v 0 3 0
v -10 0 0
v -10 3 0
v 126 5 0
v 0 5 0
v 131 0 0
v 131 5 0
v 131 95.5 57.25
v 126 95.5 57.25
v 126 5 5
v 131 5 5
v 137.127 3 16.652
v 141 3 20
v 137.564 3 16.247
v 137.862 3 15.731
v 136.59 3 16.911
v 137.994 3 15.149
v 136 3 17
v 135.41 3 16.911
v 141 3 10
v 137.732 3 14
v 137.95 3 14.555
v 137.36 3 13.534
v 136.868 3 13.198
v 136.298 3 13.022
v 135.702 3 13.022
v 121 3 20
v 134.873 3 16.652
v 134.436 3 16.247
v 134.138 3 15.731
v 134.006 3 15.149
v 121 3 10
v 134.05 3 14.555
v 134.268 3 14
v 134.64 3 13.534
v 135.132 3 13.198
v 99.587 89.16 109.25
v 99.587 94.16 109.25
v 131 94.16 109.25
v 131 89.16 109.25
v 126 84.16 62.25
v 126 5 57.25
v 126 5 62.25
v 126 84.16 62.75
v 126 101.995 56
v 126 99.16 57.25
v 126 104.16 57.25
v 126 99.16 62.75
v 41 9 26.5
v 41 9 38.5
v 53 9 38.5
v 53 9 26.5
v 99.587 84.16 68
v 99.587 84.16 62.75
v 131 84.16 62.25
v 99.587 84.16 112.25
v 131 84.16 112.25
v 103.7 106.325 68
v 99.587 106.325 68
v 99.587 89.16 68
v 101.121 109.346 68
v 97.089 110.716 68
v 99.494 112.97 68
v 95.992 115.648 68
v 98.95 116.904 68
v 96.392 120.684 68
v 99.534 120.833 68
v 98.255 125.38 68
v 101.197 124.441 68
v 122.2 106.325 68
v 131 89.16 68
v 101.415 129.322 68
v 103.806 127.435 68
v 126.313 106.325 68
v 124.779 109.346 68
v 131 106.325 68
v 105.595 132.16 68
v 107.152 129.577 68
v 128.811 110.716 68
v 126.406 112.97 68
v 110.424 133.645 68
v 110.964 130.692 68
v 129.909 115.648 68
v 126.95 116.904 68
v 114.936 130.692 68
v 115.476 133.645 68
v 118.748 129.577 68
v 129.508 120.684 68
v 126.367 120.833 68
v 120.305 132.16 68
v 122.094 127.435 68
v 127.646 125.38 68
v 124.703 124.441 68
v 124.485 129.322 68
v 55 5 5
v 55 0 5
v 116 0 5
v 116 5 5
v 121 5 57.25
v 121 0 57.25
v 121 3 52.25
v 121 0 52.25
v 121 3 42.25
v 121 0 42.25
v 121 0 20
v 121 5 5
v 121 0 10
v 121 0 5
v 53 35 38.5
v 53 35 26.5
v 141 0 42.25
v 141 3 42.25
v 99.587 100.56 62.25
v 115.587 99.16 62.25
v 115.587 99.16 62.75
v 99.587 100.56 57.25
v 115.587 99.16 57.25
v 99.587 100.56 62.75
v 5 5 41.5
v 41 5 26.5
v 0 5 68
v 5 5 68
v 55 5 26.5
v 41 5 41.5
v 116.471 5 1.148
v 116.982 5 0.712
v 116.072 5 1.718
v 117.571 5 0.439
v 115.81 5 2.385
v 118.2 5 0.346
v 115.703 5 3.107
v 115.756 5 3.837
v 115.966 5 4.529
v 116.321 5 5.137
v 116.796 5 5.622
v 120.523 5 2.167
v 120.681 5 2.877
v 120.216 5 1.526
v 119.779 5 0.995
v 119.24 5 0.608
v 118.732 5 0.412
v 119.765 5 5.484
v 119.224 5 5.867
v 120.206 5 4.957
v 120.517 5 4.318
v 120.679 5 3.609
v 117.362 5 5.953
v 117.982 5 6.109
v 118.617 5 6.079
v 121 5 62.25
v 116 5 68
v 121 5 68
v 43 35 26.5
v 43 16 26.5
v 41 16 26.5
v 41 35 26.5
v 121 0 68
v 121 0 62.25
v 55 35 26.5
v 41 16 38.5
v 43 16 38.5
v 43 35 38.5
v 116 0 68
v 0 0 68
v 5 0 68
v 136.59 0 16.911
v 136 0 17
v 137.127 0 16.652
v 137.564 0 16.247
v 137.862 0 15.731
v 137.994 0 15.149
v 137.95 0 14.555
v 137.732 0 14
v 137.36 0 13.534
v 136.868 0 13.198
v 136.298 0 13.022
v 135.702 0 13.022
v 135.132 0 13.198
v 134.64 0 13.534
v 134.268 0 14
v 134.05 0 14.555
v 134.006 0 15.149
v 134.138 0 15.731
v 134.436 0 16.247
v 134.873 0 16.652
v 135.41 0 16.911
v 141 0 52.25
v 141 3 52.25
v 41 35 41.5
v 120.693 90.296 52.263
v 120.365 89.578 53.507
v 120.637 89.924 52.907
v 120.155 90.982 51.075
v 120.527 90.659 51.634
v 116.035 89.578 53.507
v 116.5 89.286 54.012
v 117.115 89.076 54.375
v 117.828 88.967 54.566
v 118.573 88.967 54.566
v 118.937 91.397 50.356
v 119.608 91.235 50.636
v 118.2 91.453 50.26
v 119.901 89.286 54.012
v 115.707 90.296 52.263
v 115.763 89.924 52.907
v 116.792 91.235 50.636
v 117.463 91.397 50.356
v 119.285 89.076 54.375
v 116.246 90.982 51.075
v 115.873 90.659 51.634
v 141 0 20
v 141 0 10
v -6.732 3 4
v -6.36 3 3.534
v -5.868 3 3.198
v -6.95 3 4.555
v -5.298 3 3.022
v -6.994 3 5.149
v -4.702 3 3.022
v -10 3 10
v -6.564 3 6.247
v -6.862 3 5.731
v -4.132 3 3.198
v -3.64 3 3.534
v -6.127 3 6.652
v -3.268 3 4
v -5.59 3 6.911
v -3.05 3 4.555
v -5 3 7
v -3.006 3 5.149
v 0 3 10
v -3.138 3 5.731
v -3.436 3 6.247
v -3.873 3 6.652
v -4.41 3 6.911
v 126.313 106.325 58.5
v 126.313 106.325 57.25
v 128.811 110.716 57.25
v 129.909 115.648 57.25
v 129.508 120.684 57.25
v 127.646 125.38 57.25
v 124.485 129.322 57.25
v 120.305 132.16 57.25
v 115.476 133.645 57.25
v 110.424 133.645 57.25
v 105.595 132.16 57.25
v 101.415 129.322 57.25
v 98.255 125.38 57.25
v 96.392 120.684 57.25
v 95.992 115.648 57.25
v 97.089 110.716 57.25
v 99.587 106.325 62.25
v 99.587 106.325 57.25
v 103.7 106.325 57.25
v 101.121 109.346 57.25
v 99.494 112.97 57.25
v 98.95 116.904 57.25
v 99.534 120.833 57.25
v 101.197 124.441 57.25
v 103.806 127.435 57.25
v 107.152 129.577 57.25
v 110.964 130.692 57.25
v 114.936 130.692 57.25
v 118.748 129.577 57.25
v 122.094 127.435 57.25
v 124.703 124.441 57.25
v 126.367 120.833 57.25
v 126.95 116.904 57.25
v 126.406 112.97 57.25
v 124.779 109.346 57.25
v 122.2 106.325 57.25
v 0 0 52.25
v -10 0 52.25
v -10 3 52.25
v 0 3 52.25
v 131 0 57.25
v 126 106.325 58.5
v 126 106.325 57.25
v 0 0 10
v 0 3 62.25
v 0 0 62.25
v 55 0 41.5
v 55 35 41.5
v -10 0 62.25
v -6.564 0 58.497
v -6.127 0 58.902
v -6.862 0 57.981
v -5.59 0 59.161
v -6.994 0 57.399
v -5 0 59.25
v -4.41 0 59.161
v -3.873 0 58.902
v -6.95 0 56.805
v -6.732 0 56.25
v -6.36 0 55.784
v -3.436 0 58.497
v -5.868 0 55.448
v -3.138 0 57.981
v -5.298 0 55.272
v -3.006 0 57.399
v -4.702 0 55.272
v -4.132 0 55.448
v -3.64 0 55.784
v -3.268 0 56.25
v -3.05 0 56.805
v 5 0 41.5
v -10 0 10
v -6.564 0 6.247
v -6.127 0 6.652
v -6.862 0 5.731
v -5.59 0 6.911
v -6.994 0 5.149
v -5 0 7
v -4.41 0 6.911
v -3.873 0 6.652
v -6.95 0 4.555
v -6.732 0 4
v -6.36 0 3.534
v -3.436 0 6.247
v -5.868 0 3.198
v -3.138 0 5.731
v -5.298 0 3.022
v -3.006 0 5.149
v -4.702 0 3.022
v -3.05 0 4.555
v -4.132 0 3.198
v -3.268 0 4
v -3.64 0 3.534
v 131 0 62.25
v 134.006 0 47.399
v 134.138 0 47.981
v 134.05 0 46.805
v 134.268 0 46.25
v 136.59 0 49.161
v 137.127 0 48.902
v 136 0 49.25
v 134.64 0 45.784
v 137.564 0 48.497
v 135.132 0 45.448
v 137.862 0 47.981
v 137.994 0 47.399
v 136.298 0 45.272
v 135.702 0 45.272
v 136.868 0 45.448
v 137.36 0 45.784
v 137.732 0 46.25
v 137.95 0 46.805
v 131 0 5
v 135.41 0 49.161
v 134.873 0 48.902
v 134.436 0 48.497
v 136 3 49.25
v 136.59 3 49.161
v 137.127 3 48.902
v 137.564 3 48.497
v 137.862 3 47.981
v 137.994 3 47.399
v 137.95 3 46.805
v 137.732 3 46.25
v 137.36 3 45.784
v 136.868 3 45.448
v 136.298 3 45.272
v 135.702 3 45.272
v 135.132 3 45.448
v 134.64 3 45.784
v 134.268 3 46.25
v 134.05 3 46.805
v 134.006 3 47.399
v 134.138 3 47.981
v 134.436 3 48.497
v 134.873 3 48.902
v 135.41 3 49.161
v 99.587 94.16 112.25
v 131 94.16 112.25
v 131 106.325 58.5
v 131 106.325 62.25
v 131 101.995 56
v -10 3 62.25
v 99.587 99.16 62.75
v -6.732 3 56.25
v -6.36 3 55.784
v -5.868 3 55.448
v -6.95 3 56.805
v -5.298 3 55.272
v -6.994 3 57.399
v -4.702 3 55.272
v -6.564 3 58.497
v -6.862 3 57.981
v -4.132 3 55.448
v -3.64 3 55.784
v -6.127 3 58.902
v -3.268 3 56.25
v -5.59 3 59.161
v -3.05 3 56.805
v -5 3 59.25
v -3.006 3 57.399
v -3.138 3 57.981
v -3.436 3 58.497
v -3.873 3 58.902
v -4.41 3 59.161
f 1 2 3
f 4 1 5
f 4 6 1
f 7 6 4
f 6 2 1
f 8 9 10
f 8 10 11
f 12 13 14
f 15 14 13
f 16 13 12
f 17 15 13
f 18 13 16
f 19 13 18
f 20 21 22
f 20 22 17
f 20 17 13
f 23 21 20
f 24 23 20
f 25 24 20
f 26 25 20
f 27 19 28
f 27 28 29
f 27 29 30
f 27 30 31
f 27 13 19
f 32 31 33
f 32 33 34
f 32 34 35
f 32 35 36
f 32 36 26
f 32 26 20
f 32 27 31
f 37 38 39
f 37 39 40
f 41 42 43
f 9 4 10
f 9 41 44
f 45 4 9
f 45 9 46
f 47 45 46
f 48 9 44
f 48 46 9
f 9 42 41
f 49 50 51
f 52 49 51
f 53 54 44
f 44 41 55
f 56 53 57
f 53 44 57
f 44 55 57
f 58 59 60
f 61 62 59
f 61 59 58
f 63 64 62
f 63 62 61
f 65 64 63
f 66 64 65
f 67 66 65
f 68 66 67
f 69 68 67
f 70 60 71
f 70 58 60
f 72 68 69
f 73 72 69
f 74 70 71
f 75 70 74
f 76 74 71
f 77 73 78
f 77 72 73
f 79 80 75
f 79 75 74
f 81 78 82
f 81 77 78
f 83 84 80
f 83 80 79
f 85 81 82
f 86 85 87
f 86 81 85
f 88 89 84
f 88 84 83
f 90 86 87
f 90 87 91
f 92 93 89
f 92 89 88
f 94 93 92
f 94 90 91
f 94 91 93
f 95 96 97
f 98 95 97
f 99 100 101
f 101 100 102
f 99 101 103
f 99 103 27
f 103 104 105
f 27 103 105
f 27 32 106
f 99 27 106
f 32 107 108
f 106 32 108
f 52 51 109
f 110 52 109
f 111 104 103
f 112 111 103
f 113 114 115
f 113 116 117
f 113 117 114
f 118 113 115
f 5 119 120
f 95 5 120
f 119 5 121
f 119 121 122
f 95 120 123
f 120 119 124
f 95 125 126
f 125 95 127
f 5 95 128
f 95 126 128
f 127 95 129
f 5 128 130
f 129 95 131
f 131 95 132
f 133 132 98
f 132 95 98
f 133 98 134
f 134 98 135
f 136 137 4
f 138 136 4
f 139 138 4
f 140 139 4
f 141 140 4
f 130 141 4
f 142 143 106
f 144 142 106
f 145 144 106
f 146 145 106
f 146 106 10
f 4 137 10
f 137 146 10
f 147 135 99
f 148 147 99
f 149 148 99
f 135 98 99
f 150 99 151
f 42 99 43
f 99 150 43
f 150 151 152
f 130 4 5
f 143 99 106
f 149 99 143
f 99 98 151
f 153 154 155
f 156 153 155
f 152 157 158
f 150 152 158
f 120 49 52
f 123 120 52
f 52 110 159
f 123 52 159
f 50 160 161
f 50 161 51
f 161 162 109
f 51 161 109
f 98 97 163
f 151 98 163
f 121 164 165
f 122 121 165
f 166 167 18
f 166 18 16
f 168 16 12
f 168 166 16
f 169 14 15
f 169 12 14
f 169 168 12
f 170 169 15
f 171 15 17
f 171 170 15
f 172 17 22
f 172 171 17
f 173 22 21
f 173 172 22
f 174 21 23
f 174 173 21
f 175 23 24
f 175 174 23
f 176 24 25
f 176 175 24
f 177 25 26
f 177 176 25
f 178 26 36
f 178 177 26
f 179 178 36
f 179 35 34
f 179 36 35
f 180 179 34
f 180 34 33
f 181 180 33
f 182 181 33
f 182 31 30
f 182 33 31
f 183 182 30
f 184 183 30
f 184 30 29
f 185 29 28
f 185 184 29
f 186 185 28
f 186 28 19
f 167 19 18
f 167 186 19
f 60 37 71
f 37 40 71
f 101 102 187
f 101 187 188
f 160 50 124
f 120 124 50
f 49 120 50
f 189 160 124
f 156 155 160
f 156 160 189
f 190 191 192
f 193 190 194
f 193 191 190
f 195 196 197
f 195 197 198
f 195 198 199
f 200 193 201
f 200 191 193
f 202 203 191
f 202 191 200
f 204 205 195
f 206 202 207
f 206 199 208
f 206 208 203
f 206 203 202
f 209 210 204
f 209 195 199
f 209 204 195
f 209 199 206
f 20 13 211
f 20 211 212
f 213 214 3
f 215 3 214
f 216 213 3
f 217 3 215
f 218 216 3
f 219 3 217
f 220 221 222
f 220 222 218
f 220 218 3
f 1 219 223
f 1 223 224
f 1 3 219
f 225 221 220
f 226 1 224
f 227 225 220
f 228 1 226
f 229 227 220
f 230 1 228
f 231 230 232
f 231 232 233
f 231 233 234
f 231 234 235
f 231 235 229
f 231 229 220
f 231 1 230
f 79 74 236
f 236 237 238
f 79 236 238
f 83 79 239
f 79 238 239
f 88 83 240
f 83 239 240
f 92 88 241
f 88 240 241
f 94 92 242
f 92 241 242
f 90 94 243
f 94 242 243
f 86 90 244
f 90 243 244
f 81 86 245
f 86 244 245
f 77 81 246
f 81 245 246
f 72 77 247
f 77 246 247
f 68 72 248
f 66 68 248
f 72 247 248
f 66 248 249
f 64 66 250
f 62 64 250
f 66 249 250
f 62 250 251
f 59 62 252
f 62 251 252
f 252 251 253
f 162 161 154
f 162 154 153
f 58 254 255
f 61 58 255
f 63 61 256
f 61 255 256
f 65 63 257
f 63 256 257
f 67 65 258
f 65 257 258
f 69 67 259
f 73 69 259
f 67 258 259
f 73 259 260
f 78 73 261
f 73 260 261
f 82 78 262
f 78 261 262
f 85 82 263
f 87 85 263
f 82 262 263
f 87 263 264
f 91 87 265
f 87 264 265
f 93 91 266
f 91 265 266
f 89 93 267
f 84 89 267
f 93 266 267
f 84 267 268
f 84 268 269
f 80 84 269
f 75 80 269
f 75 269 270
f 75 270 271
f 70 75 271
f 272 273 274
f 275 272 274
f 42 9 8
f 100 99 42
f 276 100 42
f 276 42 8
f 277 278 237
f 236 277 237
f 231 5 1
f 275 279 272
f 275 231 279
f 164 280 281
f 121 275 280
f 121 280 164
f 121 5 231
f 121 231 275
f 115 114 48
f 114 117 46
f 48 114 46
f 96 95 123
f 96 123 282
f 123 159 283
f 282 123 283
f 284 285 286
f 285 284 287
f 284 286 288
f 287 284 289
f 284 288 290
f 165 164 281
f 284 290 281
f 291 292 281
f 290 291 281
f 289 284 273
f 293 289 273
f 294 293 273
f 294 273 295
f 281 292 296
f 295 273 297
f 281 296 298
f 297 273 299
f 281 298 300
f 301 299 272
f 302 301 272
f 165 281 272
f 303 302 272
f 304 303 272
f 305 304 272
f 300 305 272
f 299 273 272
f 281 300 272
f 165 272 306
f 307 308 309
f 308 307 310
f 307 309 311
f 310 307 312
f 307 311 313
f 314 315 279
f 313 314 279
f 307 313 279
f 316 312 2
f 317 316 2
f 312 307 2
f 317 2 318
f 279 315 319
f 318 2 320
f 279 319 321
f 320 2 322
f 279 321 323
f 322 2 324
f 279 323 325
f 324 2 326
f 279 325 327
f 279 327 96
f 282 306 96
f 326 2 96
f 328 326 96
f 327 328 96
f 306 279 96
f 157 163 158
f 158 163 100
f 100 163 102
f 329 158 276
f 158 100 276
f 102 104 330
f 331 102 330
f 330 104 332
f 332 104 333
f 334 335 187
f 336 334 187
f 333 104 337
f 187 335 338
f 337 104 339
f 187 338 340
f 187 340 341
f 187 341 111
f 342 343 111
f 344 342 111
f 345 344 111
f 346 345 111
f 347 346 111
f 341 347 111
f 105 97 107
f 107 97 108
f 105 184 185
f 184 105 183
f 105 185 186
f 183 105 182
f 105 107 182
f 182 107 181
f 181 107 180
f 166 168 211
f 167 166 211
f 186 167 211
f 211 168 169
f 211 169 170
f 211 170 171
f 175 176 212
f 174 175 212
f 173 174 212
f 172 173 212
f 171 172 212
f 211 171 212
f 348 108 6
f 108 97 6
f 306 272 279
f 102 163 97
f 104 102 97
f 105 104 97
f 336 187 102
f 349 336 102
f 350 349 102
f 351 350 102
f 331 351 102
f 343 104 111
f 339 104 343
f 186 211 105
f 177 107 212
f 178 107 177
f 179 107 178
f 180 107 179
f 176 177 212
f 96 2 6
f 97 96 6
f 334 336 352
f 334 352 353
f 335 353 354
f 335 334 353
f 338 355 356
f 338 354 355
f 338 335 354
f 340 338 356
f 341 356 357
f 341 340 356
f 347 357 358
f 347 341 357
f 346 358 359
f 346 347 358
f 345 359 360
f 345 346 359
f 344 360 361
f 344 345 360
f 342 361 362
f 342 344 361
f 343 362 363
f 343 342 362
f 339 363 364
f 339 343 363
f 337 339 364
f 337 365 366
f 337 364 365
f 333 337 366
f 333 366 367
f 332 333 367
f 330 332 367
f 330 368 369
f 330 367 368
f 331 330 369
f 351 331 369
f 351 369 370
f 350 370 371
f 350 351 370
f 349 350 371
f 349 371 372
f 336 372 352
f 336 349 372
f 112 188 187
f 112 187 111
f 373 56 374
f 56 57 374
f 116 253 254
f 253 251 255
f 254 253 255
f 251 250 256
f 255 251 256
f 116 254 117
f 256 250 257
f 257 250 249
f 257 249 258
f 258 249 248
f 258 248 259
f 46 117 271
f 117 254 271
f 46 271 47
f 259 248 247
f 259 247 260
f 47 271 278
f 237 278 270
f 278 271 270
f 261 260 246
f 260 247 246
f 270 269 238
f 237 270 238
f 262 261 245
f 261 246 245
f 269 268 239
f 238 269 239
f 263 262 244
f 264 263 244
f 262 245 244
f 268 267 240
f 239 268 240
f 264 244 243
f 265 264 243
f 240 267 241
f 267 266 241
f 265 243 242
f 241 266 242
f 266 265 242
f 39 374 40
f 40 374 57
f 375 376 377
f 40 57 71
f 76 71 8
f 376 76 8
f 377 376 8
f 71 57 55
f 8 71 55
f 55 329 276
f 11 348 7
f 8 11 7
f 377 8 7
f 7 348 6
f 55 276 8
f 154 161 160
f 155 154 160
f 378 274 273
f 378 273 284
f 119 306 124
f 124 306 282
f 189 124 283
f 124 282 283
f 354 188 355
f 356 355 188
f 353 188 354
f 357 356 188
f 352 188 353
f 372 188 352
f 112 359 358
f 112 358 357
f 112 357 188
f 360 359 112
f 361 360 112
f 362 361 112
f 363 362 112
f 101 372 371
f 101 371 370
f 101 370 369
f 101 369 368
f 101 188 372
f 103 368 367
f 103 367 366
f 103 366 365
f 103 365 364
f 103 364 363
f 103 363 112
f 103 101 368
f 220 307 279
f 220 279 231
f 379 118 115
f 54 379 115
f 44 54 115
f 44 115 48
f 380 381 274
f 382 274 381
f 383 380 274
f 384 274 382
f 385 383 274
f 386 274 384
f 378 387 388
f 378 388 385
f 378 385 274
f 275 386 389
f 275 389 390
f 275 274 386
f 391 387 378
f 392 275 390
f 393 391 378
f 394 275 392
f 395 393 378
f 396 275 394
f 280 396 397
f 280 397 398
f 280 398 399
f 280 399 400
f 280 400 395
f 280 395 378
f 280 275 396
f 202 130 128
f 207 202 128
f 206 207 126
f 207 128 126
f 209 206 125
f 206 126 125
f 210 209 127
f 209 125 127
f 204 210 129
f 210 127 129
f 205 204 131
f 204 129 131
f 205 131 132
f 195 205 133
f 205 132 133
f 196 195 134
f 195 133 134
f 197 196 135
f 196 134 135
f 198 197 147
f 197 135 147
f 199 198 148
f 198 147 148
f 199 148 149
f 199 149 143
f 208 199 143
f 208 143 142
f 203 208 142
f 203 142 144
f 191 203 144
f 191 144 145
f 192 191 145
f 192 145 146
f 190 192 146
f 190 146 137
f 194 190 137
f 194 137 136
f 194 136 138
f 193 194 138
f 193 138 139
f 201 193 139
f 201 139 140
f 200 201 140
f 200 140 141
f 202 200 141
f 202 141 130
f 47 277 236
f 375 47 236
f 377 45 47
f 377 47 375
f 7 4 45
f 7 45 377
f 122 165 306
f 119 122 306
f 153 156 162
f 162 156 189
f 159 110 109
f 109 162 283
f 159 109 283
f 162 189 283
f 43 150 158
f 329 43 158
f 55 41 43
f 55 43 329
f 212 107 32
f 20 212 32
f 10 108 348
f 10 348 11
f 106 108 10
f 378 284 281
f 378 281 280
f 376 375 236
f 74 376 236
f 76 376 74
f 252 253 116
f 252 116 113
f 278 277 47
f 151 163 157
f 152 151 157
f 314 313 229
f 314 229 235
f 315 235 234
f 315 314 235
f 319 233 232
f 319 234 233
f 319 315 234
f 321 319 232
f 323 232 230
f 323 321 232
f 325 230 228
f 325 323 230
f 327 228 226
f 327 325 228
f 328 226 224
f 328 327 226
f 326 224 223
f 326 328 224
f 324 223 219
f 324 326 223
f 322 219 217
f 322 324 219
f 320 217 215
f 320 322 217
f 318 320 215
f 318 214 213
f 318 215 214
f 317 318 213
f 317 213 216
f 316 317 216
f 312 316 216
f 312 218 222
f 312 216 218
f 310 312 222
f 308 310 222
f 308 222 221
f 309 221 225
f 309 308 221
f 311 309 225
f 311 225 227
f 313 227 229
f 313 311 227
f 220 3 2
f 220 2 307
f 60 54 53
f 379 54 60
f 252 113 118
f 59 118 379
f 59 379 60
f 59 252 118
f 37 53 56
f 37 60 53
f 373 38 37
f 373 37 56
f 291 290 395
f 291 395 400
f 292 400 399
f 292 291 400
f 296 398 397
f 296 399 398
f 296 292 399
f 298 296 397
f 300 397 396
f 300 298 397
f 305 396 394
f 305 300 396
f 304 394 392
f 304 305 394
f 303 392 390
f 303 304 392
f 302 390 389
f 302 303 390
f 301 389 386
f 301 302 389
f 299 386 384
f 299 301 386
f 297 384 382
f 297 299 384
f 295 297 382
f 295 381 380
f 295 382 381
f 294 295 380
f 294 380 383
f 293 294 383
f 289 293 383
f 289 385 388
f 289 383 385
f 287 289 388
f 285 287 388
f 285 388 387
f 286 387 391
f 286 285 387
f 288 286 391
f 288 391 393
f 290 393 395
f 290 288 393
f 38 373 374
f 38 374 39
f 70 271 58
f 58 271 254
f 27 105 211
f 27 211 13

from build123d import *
from OCP.BRepAlgoAPI import BRepAlgoAPI_Cut
from OCP.TopTools import TopTools_ListOfShape

# Parameters (mm, degrees)
BOSS_EXTRUDE1_DEPTH              = 5
SKETCH2_R                        = 2.5
BOSS_EXTRUDE2_DEPTH              = 100
SKETCH3_W                        = 5
SKETCH3_H                        = 5
BOSS_EXTRUDE3_DEPTH              = 10
SKETCH5_W                        = 5
SKETCH5_H                        = 4.330127019
BOSS_EXTRUDE4_DEPTH              = 117
SKETCH6_W                        = 5
SKETCH6_H                        = 5
BOSS_EXTRUDE5_DEPTH              = 20
BOSS_EXTRUDE6_DEPTH              = 15
SKETCH9_W                        = 5
SKETCH9_H                        = 5
BOSS_EXTRUDE7_DEPTH              = 10
SKETCH10_W                       = 5
SKETCH10_H                       = 5
BOSS_EXTRUDE8_DEPTH              = 99.159909
SKETCH11_W                       = 10
SKETCH11_H                       = 3
BOSS_EXTRUDE9_DEPTH              = 10
CUT_EXTRUDE1_DEPTH               = 187.084790711
CUT_EXTRUDE1_DEPTH_BACK          = 187.084790711
SKETCH13_R                       = 2
SKETCH14_W                       = 10
SKETCH14_H                       = 3
BOSS_EXTRUDE10_DEPTH             = 20
CUT_EXTRUDE2_DEPTH               = 194.255140511
CUT_EXTRUDE2_DEPTH_BACK          = 194.255140511
SKETCH15_R                       = 2
BOSS_EXTRUDE11_DEPTH             = 7.8
CUT_EXTRUDE3_DEPTH               = 187.016127587
CUT_EXTRUDE3_DEPTH_BACK          = 187.016127587
SKETCH17_W                       = 22.17902444
SKETCH17_H                       = 20
BOSS_EXTRUDE12_DEPTH             = 5.75
BOSS_EXTRUDE12_DEPTH_BACK        = 5
SKETCH19_W                       = 1.5
SKETCH19_H                       = 10.75
BOSS_EXTRUDE13_DEPTH             = 2.742414
SKETCH21_W                       = 1.5
SKETCH21_H                       = 1
BOSS_EXTRUDE15_DEPTH             = 1
BOSS_EXTRUDE17_REACH             = 195.512
CUT_EXTRUDE4_START               = 2
SKETCH23_W                       = 7.8
SKETCH23_H                       = 12
CUT_EXTRUDE4_DEPTH               = 10
BOSS_EXTRUDE19_DEPTH             = 5
BOSS_EXTRUDE19_DEPTH_BACK        = 2.165064
SKETCH23_2_W                     = 7.8
SKETCH23_2_H                     = 12
CUT_EXTRUDE5_DEPTH               = 1.25
BOSS_EXTRUDE20_REACH             = 188.016
SKETCH25_W                       = 5
SKETCH25_H                       = 4.330127019
SKETCH26_W                       = 5
SKETCH26_H                       = 2.16506351
CUT_EXTRUDE6_DEPTH               = 5
SKETCH27_W                       = 5.75
SKETCH27_H                       = 7.16506351
BOSS_EXTRUDE21_DEPTH             = 5
SKETCH29_W                       = 3
SKETCH29_H                       = 30
BOSS_EXTRUDE22_DEPTH             = 55
SKETCH30_W                       = 5
SKETCH30_H                       = 3
BOSS_EXTRUDE23_DEPTH             = 5
SKETCH31_W                       = 5
SKETCH31_H                       = 5
BOSS_EXTRUDE24_DEPTH             = 33.5
SKETCH32_W                       = 2
SKETCH32_H                       = 19
BOSS_EXTRUDE25_DEPTH             = 12
SKETCH34_W                       = 41
SKETCH34_H                       = 3
CUT_EXTRUDE7_DEPTH               = 30
SKETCH35_W                       = 14
SKETCH35_H                       = 12
BOSS_EXTRUDE26_DEPTH             = 7
BOSS_EXTRUDE27_REACH             = 187.154
SKETCH36_W                       = 9
SKETCH36_H                       = 5
BOSS_EXTRUDE27_DIRECTION_2_REACH = 187.154
SKETCH37_W                       = 41.5
SKETCH37_H                       = 5
BOSS_EXTRUDE28_DEPTH             = 41
SKETCH38_W                       = 34.251665069
SKETCH38_H                       = 27.087918127
CUT_EXTRUDE8_DEPTH               = 185.330721404
SKETCH39_W                       = 67.684653824
SKETCH39_H                       = 30.030202731
CUT_EXTRUDE9_DEPTH               = 190.235302527
SKETCH44_W                       = 5
SKETCH44_H                       = 7.16506351
BOSS_EXTRUDE30_DEPTH             = 18.612596
BOSS_EXTRUDE31_DEPTH             = 10.75
BOSS_EXTRUDE32_DEPTH             = 5.75
SKETCH46_W                       = 5
SKETCH46_H                       = 5
EDIT_THIS_LENGTH_DEPTH           = 50
SKETCH47_W                       = 5
SKETCH47_H                       = 3
BOSS_EXTRUDE34_DEPTH             = 5
BOSS_EXTRUDE35_REACH             = 207.703
SKETCH48_W                       = 26.412596329
SKETCH48_H                       = 5.25
SKETCH50_W                       = 5
SKETCH50_H                       = 5.75
BOSS_EXTRUDE36_DEPTH             = 10
BOSS_EXTRUDE37_DEPTH             = 26.412596329
CHAMFER1_SIZE                    = 16
CHAMFER1_SIZE2                   = 1.399818616


with BuildPart() as part:
    # Sketch1 → Boss-Extrude1 (new body)
    with BuildSketch(Plane(origin=(0, 0, 0), x_dir=(1, 0, 0), z_dir=(0, 1, 0))):
        Polygon((121, 0), (0, 0), (0, -68), (5, -68), (5, -5), (116, -5), (116, -68), (121, -68), align=None)
    extrude(amount=BOSS_EXTRUDE1_DEPTH)

    # Sketch2 → Boss-Extrude2 (add)
    with BuildSketch(Plane(origin=(0, 3.75, 2.165063509), x_dir=(1, 0, 0), z_dir=(0, 0.866025403784438, 0.500000000000001))):
        with Locations(Location((118.200131686, -0.299868314, 0), (0, 0, 90))):
            Circle(SKETCH2_R)
    extrude(amount=BOSS_EXTRUDE2_DEPTH)

    # Sketch3 → Boss-Extrude3 (add)
    with BuildSketch(Plane(origin=(121, 0, 0), x_dir=(0, 0, -1), z_dir=(1, 0, 0))):
        with Locations((-2.5, 2.5)):
            Rectangle(SKETCH3_W, SKETCH3_H)
    extrude(amount=BOSS_EXTRUDE3_DEPTH)

    # Sketch5 → Boss-Extrude4 (add)
    with BuildSketch(Plane(origin=(0, 3.75, 2.165063509), x_dir=(1, 0, 0), z_dir=(0, 0.866025403784438, 0.500000000000001))):
        with Locations((128.5, 0.33493649)):
            Rectangle(SKETCH5_W, SKETCH5_H)
    extrude(amount=BOSS_EXTRUDE4_DEPTH)

    # Sketch6 → Boss-Extrude5 (add)
    with BuildSketch(Plane(origin=(0, 1.25, -2.165063509), x_dir=(-1, 0, 0), z_dir=(0, 0.5000000000000009, -0.866025403784438))):
        with Locations((-128.5, 118.830127019)):
            Rectangle(SKETCH6_W, SKETCH6_H)
    extrude(amount=BOSS_EXTRUDE5_DEPTH)

    # Sketch7 → Boss-Extrude6 (add)
    with BuildSketch(Plane.ZY.offset(-126)):
        Polygon((45.509618943, 113.824972243), (41.179491924, 116.324972243), (38.679491924, 111.994845224), (43.009618943, 109.494845224), align=None)
    extrude(amount=BOSS_EXTRUDE6_DEPTH)

    # Sketch9 → Boss-Extrude7 (add)
    with BuildSketch(Plane(origin=(121, 0, 0), x_dir=(0, 0, -1), z_dir=(1, 0, 0))):
        with Locations((-59.75, 2.5)):
            Rectangle(SKETCH9_W, SKETCH9_H)
    extrude(amount=BOSS_EXTRUDE7_DEPTH)

    # Sketch10 → Boss-Extrude8 (add)
    with BuildSketch(Plane(origin=(0, 5, 0), x_dir=(1, 0, 0), z_dir=(0, 1, 0))):
        with Locations((128.5, -59.75)):
            Rectangle(SKETCH10_W, SKETCH10_H)
    extrude(amount=BOSS_EXTRUDE8_DEPTH)

    # Sketch11 → Boss-Extrude9 (add)
    with BuildSketch(Plane.ZY):
        with Locations((57.25, 1.5)):
            Rectangle(SKETCH11_W, SKETCH11_H)
        with Locations((5, 1.5)):
            Rectangle(SKETCH11_W, SKETCH11_H)
    extrude(amount=BOSS_EXTRUDE9_DEPTH)

    # Sketch13 → Cut-Extrude1 (cut, two sides: drawn at the far end of the back side and taken through both)
    with BuildSketch(Plane(origin=(0, 3, 0), x_dir=(1, 0, 0), z_dir=(0, 1, 0)).offset(-CUT_EXTRUDE1_DEPTH_BACK)):
        with Locations(Location((-5, -5, 0), (0, 0, 270))):
            Circle(SKETCH13_R)
        with Locations(Location((-5, -57.25, 0), (0, 0, 270))):
            Circle(SKETCH13_R)
    extrude(amount=CUT_EXTRUDE1_DEPTH + CUT_EXTRUDE1_DEPTH_BACK, mode=Mode.SUBTRACT)

    # Sketch14 → Boss-Extrude10 (add)
    with BuildSketch(Plane(origin=(121, 0, 0), x_dir=(0, 0, -1), z_dir=(1, 0, 0))):
        with Locations((-15, 1.5)):
            Rectangle(SKETCH14_W, SKETCH14_H)
        with Locations((-47.25, 1.5)):
            Rectangle(SKETCH14_W, SKETCH14_H)
    extrude(amount=BOSS_EXTRUDE10_DEPTH)

    # Sketch15 → Cut-Extrude2 (cut, two sides: drawn at the far end of the back side and taken through both)
    with BuildSketch(Plane(origin=(0, 3, 0), x_dir=(1, 0, 0), z_dir=(0, 1, 0)).offset(-CUT_EXTRUDE2_DEPTH_BACK)):
        with Locations(Location((136, -15, 0), (0, 0, 270))):
            Circle(SKETCH15_R)
        with Locations(Location((136, -47.25, 0), (0, 0, 270))):
            Circle(SKETCH15_R)
    extrude(amount=CUT_EXTRUDE2_DEPTH + CUT_EXTRUDE2_DEPTH_BACK, mode=Mode.SUBTRACT)

    # Sketch16 → Boss-Extrude11 (add)
    with BuildSketch(Plane.ZY.offset(-126)):
        Polygon((49.839745962, 111.324972243), (67, 101.417494955), (64.5, 97.087367936), (47.339745962, 106.994845224), align=None)
    extrude(amount=BOSS_EXTRUDE11_DEPTH)

    # Sketch17 → Cut-Extrude3 (cut, two sides: drawn at the far end of the back side and taken through both)
    with BuildSketch(Plane(origin=(0, 105.074972243, 60.665063509), x_dir=(1, 0, 0), z_dir=(0, 0.8660254037844382, 0.500000000000001)).offset(-CUT_EXTRUDE3_DEPTH_BACK)):
        with Locations((119.91048778, 12.5)):
            Rectangle(SKETCH17_W, SKETCH17_H)
    extrude(amount=CUT_EXTRUDE3_DEPTH + CUT_EXTRUDE3_DEPTH_BACK, mode=Mode.SUBTRACT)



with BuildPart() as body_2:
    # Sketch18 → Boss-Extrude12 (new, two sides: drawn at the far end of the back side and taken through both)
    with BuildSketch(Plane.XY.offset(62.25).offset(-BOSS_EXTRUDE12_DEPTH_BACK)):
        with BuildLine():
            Line((118.2, 104.159908733), (119.7, 104.159908733))
            ThreePointArc((119.7, 104.159908733), (110.2, 113.659908733), (100.7, 104.159908733))
            Line((100.7, 104.159908733), (102.2, 104.159908733))
            ThreePointArc((102.2, 104.159908733), (110.2, 112.159908733), (118.2, 104.159908733))
        make_face()
    extrude(amount=BOSS_EXTRUDE12_DEPTH + BOSS_EXTRUDE12_DEPTH_BACK)


with BuildPart() as part_1:
    add(part.part)

    add(body_2.part)  # Boss-Extrude13 merges body 2
    # Sketch19 → Boss-Extrude13 (add)
    with BuildSketch(Plane.XZ.offset(-104.159908733)):
        with Locations((118.95, 62.625)):
            Rectangle(SKETCH19_W, SKETCH19_H)
    extrude(amount=BOSS_EXTRUDE13_DEPTH)

    # Sketch21 → Boss-Extrude15 (add)
    with BuildSketch(Plane.XZ.offset(-101.417494955)):
        with Locations((118.95, 67.5)):
            Rectangle(SKETCH21_W, SKETCH21_H)
    extrude(amount=BOSS_EXTRUDE15_DEPTH)

    # Boss-Extrude17: up to this plane
    boss_extrude17_end = Plane(origin=(119.7, 101.417494955, 68), z_dir=(0, 0, -1))
    # Sketch20 → Boss-Extrude17 (add, up to the surface)
    with BuildSketch(Plane(origin=(0, -3.657477288, 6.334936491), x_dir=(1, 0, 0), z_dir=(0, -0.5000000000000039, 0.8660254037844365)), mode=Mode.PRIVATE) as boss_extrude17_sk1:
        Polygon((126, 116.330127019), (126, 121.330127019), (119.7, 121.330127019), (118.2, 121.330127019), (118.2, 116.330127019), align=None)
    boss_extrude17_tool1 = split(extrude(boss_extrude17_sk1.sketch, amount=BOSS_EXTRUDE17_REACH, mode=Mode.PRIVATE), bisect_by=boss_extrude17_end, keep=Keep.BOTH, mode=Mode.PRIVATE)
    add(boss_extrude17_tool1.solids().sort_by_distance((122.1, 99.252431, 65.75))[0])

    # Sketch23 → Cut-Extrude4 (cut)
    with BuildSketch(Plane(origin=(0, 104.159908733, 0), x_dir=(-1, 0, 0), z_dir=(0, -1, 0)).offset(CUT_EXTRUDE4_START)):
        with Locations((-122.1, -62)):
            Rectangle(SKETCH23_W, SKETCH23_H)
    extrude(amount=CUT_EXTRUDE4_DEPTH, mode=Mode.SUBTRACT)

    # Sketch23<2> → Boss-Extrude19 (add, two sides: drawn at the far end of the back side and taken through both)
    with BuildSketch(Plane(origin=(0, 104.159908733, 0), x_dir=(-1, 0, 0), z_dir=(0, -1, 0)).offset(-BOSS_EXTRUDE19_DEPTH_BACK)):
        with Locations((-122.1, -62)):
            Rectangle(SKETCH23_2_W, SKETCH23_2_H)
    extrude(amount=BOSS_EXTRUDE19_DEPTH + BOSS_EXTRUDE19_DEPTH_BACK)


with BuildPart() as cut_extrude5_tool:
    # Sketch24 → Cut-Extrude5 (new body)
    with BuildSketch(Plane(origin=(0, 0, 56), x_dir=(-1, 0, 0), z_dir=(0, 0, -1))):
        Polygon((-126, 106.324972243), (-126, 101.994845224), (-126, 99.159908733), (-118.2, 99.159908733), (-118.2, 106.324972243), align=None)
    extrude(amount=-CUT_EXTRUDE5_DEPTH)


with BuildPart() as part_2:
    add(part_1.part)

    # Cut-Extrude5: cut by cut_extrude5_tool, with a tolerance
    cut_extrude5_stock = TopTools_ListOfShape()
    cut_extrude5_stock.Append(part_2.part.wrapped)
    cut_extrude5_tools = TopTools_ListOfShape()
    cut_extrude5_tools.Append(cut_extrude5_tool.part.wrapped)
    cut_extrude5_cut = BRepAlgoAPI_Cut()
    cut_extrude5_cut.SetArguments(cut_extrude5_stock)
    cut_extrude5_cut.SetTools(cut_extrude5_tools)
    cut_extrude5_cut.SetFuzzyValue(0.00001)
    cut_extrude5_cut.Build()
    add(Compound.cast(cut_extrude5_cut.Shape()).solids(), mode=Mode.REPLACE)

    # Boss-Extrude20: up to this face of the body (flat: up to its plane)
    boss_extrude20_end = Plane(part_2.part.faces().sort_by_distance((122.724999943, 106.324972733, 62.625))[0])
    # Sketch25 → Boss-Extrude20 (add, up to the picked face)
    with BuildSketch(Plane(origin=(0, 105.074972243, 60.665063509), x_dir=(1, 0, 0), z_dir=(0, 0.8660254037844382, 0.500000000000001)), mode=Mode.PRIVATE) as boss_extrude20_sk1:
        with Locations((128.5, 0.33493649)):
            Rectangle(SKETCH25_W, SKETCH25_H)
    boss_extrude20_tool1 = split(extrude(boss_extrude20_sk1.sketch, amount=BOSS_EXTRUDE20_REACH, mode=Mode.PRIVATE), bisect_by=boss_extrude20_end, keep=Keep.BOTH, mode=Mode.PRIVATE)
    add(boss_extrude20_tool1.solids().sort_by(Axis((128.5, 105.24244, 60.375), (0, 0.8660254037844382, 0.500000000000001)))[0])


with BuildPart() as cut_extrude6_tool:
    # Sketch26 → Cut-Extrude6 (new body)
    with BuildSketch(Plane.XY.offset(62.25)):
        with Locations((128.5, 105.242440488)):
            Rectangle(SKETCH26_W, SKETCH26_H)
    extrude(amount=CUT_EXTRUDE6_DEPTH)


with BuildPart() as part_3:
    add(part_2.part)

    # Cut-Extrude6: cut by cut_extrude6_tool, with a tolerance
    cut_extrude6_stock = TopTools_ListOfShape()
    cut_extrude6_stock.Append(part_3.part.wrapped)
    cut_extrude6_tools = TopTools_ListOfShape()
    cut_extrude6_tools.Append(cut_extrude6_tool.part.wrapped)
    cut_extrude6_cut = BRepAlgoAPI_Cut()
    cut_extrude6_cut.SetArguments(cut_extrude6_stock)
    cut_extrude6_cut.SetTools(cut_extrude6_tools)
    cut_extrude6_cut.SetFuzzyValue(0.00001)
    cut_extrude6_cut.Build()
    add(Compound.cast(cut_extrude6_cut.Shape()).solids(), mode=Mode.REPLACE)

    # Sketch27 → Boss-Extrude21 (add)
    with BuildSketch(Plane(origin=(126, 0, 0), x_dir=(0, 0, -1), z_dir=(1, 0, 0))):
        with Locations((-65.125, 102.742440488)):
            Rectangle(SKETCH27_W, SKETCH27_H)
    extrude(amount=BOSS_EXTRUDE21_DEPTH)

    # Sketch29 → Boss-Extrude22 (add)
    with BuildSketch(Plane.ZY):
        with Locations((40, 20)):
            Rectangle(SKETCH29_W, SKETCH29_H)
    extrude(amount=-BOSS_EXTRUDE22_DEPTH)

    # Sketch30 → Boss-Extrude23 (add)
    with BuildSketch(Plane.XZ.offset(-5)):
        with Locations((52.5, 40)):
            Rectangle(SKETCH30_W, SKETCH30_H)
    extrude(amount=BOSS_EXTRUDE23_DEPTH)

    # Sketch31 → Boss-Extrude24 (add)
    with BuildSketch(Plane(origin=(0, 0, 38.5), x_dir=(-1, 0, 0), z_dir=(0, 0, -1))):
        with Locations((-52.5, 2.5)):
            Rectangle(SKETCH31_W, SKETCH31_H)
    extrude(amount=BOSS_EXTRUDE24_DEPTH)

    # Sketch32 → Boss-Extrude25 (add)
    with BuildSketch(Plane(origin=(0, 0, 38.5), x_dir=(-1, 0, 0), z_dir=(0, 0, -1))):
        Polygon((-41, 9), (-53, 9), (-53, 35), (-55, 35), (-55, 7), (-41, 7), align=None)
        with Locations((-42, 25.5)):
            Rectangle(SKETCH32_W, SKETCH32_H)
    extrude(amount=BOSS_EXTRUDE25_DEPTH)

    # Sketch34 → Cut-Extrude7 (cut)
    with BuildSketch(Plane(origin=(0, 35, 0), x_dir=(1, 0, 0), z_dir=(0, 1, 0))):
        with Locations((20.5, -40)):
            Rectangle(SKETCH34_W, SKETCH34_H)
    extrude(amount=-CUT_EXTRUDE7_DEPTH, mode=Mode.SUBTRACT)

    # Sketch35 → Boss-Extrude26 (add)
    with BuildSketch(Plane.XZ.offset(-7)):
        with Locations((48, 32.5)):
            Rectangle(SKETCH35_W, SKETCH35_H)
    extrude(amount=BOSS_EXTRUDE26_DEPTH)

    # Boss-Extrude27: up to this face of the body (flat: up to its plane)
    boss_extrude27_end = Plane(part_3.part.faces().sort_by_distance((48.252808989, 19.016853933, 41.5))[0])
    # Sketch36 → Boss-Extrude27 (add, up to the picked face)
    with BuildSketch(Plane.XY.offset(38.5), mode=Mode.PRIVATE) as boss_extrude27_sk1:
        with Locations((45.5, 2.5)):
            Rectangle(SKETCH36_W, SKETCH36_H)
    boss_extrude27_tool1 = split(extrude(boss_extrude27_sk1.sketch, amount=BOSS_EXTRUDE27_REACH, mode=Mode.PRIVATE), bisect_by=boss_extrude27_end, keep=Keep.BOTH, mode=Mode.PRIVATE)
    add(boss_extrude27_tool1.solids().sort_by(Axis((45.5, 2.5, 38.5), (0, 0, 1)))[0])

    # Boss-Extrude27 direction 2: up to this face of the body (flat: up to its plane)
    boss_extrude27_direction_2_end = Plane(part_3.part.faces().sort_by_distance((27.5, 2.5, 5))[0])
    # Sketch36 → Boss-Extrude27 direction 2 (add, up to the picked face)
    with BuildSketch(Plane.XY.offset(38.5), mode=Mode.PRIVATE) as boss_extrude27_direction_2_sk1:
        with Locations((45.5, 2.5)):
            Rectangle(SKETCH36_W, SKETCH36_H)
    boss_extrude27_direction_2_tool1 = split(extrude(boss_extrude27_direction_2_sk1.sketch, amount=-BOSS_EXTRUDE27_DIRECTION_2_REACH, mode=Mode.PRIVATE), bisect_by=boss_extrude27_direction_2_end, keep=Keep.BOTH, mode=Mode.PRIVATE)
    add(boss_extrude27_direction_2_tool1.solids().sort_by(Axis((45.5, 2.5, 38.5), (0, 0, -1)))[0])

    # Sketch37 → Boss-Extrude28 (add)
    with BuildSketch(Plane.ZY.offset(-41)):
        with Locations((20.75, 2.5)):
            Rectangle(SKETCH37_W, SKETCH37_H)
    extrude(amount=BOSS_EXTRUDE28_DEPTH)

    # Sketch38 → Cut-Extrude8 (cut, through all)
    with BuildSketch(Plane.ZY.offset(-118.2)):
        with Locations((61.183105348, 109.662346151)):
            Rectangle(SKETCH38_W, SKETCH38_H)
    extrude(amount=CUT_EXTRUDE8_DEPTH, mode=Mode.SUBTRACT)

    # Sketch39 → Cut-Extrude9 (cut, through all)
    with BuildSketch(Plane(origin=(0, 106.324972243, 0), x_dir=(1, 0, 0), z_dir=(0, 1, 0))):
        with Locations((120.498501698, -57.225220953)):
            Rectangle(SKETCH39_W, SKETCH39_H)
    extrude(amount=CUT_EXTRUDE9_DEPTH, mode=Mode.SUBTRACT)

    # Sketch44 → Boss-Extrude30 (add)
    with BuildSketch(Plane.ZY.offset(-118.2)):
        with Locations((59.75, 102.742440488)):
            Rectangle(SKETCH44_W, SKETCH44_H)
    extrude(amount=BOSS_EXTRUDE30_DEPTH)

    # Sketch43 → Boss-Extrude31 (add)
    with BuildSketch(Plane(origin=(0, 0, 57.25), x_dir=(-1, 0, 0), z_dir=(0, 0, -1))):
        with BuildLine():
            Line((-122.200131686, 106.324972243), (-126, 106.324972243))
            Line((-126, 106.324972243), (-126.312859701, 106.324972243))
            ThreePointArc((-126.312859701, 106.324972243), (-112.950131686, 133.833897021), (-99.587403671, 106.324972243))
            Line((-99.587403671, 106.324972243), (-103.700131686, 106.324972243))
            ThreePointArc((-103.700131686, 106.324972243), (-112.950131686, 130.833897021), (-122.200131686, 106.324972243))
        make_face()
    extrude(amount=-BOSS_EXTRUDE31_DEPTH)

    # Sketch45 → Boss-Extrude32 (add)
    with BuildSketch(Plane.XY.offset(62.25)):
        Polygon((118.2, 99.159908733), (118.2, 106.324972243), (103.700131686, 106.324972243), (99.587403671, 106.324972243), (99.587403671, 99.159908733), align=None)
    extrude(amount=BOSS_EXTRUDE32_DEPTH)

    # Sketch46 → EDIT THIS LENGTH (add)
    with BuildSketch(Plane.XY.offset(62.25)):
        with Locations((128.5, 86.659908733)):
            Rectangle(SKETCH46_W, SKETCH46_H)
    extrude(amount=EDIT_THIS_LENGTH_DEPTH)

    # Sketch47 → Boss-Extrude34 (add)
    with BuildSketch(Plane(origin=(0, 89.159908733, 0), x_dir=(1, 0, 0), z_dir=(0, 1, 0))):
        with Locations((128.5, -110.75)):
            Rectangle(SKETCH47_W, SKETCH47_H)
    extrude(amount=BOSS_EXTRUDE34_DEPTH)

    # Boss-Extrude35: up to this face of the body (flat: up to its plane)
    boss_extrude35_end = Plane(part_3.part.faces().sort_by_distance((128.5, 84.159908733, 87.25))[0])
    # Sketch48 → Boss-Extrude35 (add, up to the picked face)
    with BuildSketch(Plane.XZ.offset(-99.159908733), mode=Mode.PRIVATE) as boss_extrude35_sk1:
        with Locations((112.793701836, 65.375)):
            Rectangle(SKETCH48_W, SKETCH48_H)
    boss_extrude35_tool1 = split(extrude(boss_extrude35_sk1.sketch, amount=BOSS_EXTRUDE35_REACH, mode=Mode.PRIVATE), bisect_by=boss_extrude35_end, keep=Keep.BOTH, mode=Mode.PRIVATE)
    add(boss_extrude35_tool1.solids().sort_by(Axis((112.793702, 99.159909, 65.375), (0, -1, 0)))[0])

    # Sketch50 → Boss-Extrude36 (add)
    with BuildSketch(Plane.XZ.offset(-99.159908733)):
        with Locations((128.5, 65.125)):
            Rectangle(SKETCH50_W, SKETCH50_H)
    extrude(amount=BOSS_EXTRUDE36_DEPTH)

    # Sketch51 → Boss-Extrude37 (add)
    with BuildSketch(Plane.ZY.offset(-126)):
        Polygon((68, 89.159908733), (68, 84.159908733), (112.25, 84.159908733), (112.25, 94.159908733), (109.25, 94.159908733), (109.25, 89.159908733), align=None)
    extrude(amount=BOSS_EXTRUDE37_DEPTH)

    # Chamfer1
    chamfer1_edges = [part_3.edges().sort_by_distance(p)[0] for p in [
        (99.587404, 99.159908733, 59.75),
    ]]
    chamfer1_side = [part_3.faces().sort_by_distance(p)[0] for p in [
        (112.793702, 99.159908733, 60),
    ]]
    chamfer(chamfer1_edges, length=CHAMFER1_SIZE, length2=CHAMFER1_SIZE2, reference=chamfer1_side[0])


solid = part_3.part
